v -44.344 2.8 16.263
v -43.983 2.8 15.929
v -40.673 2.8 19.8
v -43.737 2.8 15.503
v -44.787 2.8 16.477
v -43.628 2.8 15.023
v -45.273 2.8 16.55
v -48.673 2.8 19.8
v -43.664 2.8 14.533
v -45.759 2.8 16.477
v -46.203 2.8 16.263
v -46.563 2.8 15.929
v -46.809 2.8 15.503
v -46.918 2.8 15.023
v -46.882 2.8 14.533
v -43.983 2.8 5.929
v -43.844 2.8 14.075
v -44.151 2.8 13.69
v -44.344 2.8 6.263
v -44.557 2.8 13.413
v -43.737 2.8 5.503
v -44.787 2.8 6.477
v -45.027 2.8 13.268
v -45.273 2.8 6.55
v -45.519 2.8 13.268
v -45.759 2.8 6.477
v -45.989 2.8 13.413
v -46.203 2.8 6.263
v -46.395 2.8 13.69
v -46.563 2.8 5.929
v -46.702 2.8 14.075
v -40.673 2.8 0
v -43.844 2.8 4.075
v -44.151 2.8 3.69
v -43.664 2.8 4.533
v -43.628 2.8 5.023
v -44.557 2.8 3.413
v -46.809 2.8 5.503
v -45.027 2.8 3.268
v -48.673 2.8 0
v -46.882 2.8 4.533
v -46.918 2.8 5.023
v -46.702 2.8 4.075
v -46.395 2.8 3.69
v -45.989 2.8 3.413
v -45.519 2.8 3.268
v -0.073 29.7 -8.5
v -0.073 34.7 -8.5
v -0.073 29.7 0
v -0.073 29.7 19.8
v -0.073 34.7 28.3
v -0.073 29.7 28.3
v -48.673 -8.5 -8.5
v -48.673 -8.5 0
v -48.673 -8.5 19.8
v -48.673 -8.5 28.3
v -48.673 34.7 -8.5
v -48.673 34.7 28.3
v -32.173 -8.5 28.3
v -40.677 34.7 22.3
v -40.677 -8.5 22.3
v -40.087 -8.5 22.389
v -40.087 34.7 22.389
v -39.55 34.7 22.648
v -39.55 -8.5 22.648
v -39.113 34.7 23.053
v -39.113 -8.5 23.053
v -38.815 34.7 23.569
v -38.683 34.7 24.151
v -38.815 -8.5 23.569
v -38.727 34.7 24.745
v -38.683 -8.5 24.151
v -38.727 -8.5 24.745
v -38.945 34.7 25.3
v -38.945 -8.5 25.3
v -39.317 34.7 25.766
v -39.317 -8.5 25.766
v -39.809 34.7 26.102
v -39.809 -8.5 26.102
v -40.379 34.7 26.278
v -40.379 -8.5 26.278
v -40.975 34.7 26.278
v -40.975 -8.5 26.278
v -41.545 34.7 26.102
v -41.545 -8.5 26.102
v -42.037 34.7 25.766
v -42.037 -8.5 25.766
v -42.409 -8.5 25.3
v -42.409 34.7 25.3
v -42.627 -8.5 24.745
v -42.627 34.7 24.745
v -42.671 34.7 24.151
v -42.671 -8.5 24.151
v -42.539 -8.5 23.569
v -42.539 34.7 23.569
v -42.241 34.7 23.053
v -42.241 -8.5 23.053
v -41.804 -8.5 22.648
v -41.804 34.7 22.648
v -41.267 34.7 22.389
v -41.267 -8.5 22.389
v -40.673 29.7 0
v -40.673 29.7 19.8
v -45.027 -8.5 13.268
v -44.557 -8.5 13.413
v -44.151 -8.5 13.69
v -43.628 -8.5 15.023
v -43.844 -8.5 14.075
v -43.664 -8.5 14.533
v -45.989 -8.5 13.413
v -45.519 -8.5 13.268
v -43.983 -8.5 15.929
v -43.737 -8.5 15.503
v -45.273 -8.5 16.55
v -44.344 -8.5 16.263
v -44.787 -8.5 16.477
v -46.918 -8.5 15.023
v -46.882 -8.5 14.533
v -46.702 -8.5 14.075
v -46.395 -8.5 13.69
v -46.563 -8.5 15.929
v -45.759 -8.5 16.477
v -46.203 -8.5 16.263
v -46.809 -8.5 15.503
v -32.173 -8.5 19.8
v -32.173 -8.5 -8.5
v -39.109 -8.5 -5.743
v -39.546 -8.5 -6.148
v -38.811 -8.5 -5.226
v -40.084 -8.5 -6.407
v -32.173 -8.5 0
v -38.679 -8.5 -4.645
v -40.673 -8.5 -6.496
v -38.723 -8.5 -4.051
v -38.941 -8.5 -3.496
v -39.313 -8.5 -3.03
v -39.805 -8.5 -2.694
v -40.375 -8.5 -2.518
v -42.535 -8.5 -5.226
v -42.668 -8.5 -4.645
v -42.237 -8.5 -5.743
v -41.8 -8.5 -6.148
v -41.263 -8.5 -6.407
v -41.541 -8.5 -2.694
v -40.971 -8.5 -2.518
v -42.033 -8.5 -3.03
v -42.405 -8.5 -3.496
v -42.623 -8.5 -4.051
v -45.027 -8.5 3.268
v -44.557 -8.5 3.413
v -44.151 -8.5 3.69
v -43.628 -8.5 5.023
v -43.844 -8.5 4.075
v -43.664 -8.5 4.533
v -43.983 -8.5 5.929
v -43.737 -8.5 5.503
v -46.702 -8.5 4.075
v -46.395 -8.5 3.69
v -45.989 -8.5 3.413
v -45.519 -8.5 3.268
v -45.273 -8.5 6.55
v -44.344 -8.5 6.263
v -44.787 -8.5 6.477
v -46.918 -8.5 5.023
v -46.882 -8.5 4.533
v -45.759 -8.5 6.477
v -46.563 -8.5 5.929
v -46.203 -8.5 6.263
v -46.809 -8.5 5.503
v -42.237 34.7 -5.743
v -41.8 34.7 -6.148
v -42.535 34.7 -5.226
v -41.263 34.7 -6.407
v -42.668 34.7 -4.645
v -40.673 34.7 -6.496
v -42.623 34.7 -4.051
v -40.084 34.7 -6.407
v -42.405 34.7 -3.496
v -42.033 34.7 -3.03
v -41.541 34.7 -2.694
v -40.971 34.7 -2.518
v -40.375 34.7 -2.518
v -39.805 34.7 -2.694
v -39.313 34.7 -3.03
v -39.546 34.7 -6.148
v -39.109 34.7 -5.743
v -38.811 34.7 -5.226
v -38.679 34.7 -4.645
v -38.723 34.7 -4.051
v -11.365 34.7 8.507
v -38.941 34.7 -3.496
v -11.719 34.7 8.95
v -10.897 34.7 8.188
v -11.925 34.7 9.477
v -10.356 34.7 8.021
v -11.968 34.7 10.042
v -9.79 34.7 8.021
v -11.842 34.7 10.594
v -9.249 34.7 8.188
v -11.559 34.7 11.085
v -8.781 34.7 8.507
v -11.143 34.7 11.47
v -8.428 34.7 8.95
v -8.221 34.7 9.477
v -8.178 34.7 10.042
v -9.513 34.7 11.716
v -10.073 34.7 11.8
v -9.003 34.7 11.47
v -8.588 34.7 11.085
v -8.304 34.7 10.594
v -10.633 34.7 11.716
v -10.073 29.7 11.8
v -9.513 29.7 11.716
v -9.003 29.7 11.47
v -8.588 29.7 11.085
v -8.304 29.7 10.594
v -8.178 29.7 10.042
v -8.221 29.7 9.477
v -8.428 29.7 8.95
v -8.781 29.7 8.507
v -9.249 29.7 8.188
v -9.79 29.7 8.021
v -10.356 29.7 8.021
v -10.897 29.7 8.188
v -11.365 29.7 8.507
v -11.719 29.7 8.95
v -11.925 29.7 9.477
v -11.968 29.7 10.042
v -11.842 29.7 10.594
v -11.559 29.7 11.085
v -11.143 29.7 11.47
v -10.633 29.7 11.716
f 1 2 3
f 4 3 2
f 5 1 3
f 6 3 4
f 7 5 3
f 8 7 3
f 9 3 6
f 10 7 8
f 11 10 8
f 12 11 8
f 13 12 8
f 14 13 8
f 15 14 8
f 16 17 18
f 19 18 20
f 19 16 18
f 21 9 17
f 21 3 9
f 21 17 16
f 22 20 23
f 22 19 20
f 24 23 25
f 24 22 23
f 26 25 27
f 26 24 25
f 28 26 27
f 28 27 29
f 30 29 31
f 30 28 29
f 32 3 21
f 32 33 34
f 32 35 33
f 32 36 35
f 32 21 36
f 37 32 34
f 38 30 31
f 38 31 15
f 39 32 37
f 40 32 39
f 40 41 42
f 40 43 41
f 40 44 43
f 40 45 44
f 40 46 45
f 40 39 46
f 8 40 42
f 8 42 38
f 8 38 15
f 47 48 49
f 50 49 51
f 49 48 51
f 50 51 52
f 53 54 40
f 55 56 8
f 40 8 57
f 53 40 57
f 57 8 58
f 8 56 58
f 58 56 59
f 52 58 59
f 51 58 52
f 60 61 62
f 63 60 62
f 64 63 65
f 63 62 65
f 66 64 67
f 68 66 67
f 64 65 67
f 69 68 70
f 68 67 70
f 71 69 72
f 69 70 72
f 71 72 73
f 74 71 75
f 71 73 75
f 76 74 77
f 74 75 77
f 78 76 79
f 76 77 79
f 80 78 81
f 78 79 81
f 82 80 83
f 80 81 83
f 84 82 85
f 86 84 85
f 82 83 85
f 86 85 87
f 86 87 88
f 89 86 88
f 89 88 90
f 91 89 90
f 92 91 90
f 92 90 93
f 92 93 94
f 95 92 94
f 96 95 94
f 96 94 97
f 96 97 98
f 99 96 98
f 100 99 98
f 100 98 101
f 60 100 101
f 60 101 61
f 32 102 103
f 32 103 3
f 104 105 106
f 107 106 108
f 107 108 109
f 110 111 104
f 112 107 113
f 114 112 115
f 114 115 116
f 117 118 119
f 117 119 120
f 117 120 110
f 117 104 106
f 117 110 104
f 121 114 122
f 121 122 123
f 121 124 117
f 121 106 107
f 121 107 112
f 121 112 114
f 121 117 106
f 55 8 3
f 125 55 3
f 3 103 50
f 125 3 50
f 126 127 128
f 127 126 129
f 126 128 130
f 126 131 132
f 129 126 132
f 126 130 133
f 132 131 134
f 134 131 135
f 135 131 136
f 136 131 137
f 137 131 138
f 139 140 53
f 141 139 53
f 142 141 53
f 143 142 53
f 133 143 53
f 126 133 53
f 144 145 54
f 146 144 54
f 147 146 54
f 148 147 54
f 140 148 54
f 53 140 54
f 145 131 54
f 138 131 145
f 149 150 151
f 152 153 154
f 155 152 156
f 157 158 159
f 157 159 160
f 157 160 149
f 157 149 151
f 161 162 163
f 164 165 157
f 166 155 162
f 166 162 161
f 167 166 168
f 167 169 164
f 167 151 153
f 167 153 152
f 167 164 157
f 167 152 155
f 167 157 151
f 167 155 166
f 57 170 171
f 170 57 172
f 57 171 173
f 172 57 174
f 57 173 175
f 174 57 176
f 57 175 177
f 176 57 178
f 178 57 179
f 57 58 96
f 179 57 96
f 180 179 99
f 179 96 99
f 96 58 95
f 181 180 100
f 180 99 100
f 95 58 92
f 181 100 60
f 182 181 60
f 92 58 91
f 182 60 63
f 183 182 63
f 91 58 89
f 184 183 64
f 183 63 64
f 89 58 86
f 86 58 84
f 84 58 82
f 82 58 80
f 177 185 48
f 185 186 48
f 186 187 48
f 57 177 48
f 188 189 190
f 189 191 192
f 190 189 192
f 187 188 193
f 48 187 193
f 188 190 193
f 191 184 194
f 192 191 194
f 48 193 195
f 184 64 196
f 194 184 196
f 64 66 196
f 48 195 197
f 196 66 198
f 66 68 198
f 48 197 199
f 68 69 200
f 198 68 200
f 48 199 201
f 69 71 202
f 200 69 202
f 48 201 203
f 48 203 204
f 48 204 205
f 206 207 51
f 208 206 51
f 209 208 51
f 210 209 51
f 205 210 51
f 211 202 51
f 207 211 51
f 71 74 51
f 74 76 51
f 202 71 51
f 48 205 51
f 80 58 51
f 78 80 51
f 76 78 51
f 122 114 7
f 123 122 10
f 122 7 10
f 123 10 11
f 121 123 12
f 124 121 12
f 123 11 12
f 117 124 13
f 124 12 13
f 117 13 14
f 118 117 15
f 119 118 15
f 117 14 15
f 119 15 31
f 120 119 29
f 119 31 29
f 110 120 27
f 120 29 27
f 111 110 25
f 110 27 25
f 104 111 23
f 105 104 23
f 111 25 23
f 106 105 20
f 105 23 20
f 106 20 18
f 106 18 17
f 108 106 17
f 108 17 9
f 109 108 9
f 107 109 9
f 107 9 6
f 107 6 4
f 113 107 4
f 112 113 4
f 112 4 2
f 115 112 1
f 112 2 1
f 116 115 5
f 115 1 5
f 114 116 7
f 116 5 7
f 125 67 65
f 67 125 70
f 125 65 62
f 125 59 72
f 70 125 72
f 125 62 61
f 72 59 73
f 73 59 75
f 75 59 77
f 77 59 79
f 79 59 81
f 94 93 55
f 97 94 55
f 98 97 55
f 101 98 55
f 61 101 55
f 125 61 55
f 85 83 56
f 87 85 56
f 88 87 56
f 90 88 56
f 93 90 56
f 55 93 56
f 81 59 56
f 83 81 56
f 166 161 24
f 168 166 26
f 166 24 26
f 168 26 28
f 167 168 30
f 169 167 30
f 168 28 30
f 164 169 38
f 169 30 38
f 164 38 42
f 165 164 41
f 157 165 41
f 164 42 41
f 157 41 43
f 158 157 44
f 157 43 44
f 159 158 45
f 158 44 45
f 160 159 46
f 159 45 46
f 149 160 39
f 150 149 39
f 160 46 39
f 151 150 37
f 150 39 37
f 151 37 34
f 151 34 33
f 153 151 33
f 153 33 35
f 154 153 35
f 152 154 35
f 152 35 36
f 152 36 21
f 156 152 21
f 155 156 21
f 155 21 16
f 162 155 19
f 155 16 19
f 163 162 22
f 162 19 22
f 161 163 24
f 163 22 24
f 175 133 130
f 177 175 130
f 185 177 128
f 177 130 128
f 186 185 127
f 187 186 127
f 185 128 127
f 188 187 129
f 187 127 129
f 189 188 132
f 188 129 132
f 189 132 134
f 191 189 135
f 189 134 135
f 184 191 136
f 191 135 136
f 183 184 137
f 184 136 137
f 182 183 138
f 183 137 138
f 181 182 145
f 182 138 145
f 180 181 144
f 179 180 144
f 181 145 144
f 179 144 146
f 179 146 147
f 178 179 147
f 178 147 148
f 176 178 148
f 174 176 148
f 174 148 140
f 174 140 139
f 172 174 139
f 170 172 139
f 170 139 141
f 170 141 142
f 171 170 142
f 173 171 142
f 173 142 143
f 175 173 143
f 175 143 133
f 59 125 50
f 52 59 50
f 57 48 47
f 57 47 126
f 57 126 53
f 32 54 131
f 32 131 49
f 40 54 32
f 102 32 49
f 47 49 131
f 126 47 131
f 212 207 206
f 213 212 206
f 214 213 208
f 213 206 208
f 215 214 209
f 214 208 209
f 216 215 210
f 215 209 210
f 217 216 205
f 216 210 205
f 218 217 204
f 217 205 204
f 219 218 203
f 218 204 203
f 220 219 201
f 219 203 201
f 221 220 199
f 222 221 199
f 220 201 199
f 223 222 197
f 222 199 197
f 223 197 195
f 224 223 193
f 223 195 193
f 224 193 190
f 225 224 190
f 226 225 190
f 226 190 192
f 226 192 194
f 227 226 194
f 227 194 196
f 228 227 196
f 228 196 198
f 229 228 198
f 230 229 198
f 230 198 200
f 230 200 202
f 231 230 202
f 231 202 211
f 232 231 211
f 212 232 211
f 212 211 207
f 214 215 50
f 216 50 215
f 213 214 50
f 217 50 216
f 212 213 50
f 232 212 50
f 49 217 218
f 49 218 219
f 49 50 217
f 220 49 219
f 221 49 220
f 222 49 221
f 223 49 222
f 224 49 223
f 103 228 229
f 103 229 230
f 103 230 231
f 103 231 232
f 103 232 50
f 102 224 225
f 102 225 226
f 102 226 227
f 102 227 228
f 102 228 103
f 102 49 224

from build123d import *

# Parameters (mm, degrees)
EXTRUDE_1_DEPTH     = 19.8
EXTRUDE_1_2_DEPTH   = 19.8
SKETCH_2_W          = 1
SKETCH_2_H          = 0.8
CUT_EXTRUDE_1_DEPTH = 8
EXTRUDE_2_DEPTH     = 8.5
EXTRUDE_3_DEPTH     = 8.5
CUT_EXTRUDE_2_REACH = 72.966
SKETCH_5_R          = 1.9
CUT_EXTRUDE_5_REACH = 68.083
SKETCH_8_W          = 19.8
SKETCH_8_H          = 8.5
SKETCH_9_R          = 1.65
EXTRUDE_4_DEPTH     = 11.3
CUT_EXTRUDE_6_REACH = 72.966
SKETCH_10_R         = 2


with BuildPart() as part:
    # 草圖1 → 填料-伸長1 (new body)
    with BuildSketch(Plane.XY):
        Polygon((-40.673096552, 29.7), (-40.673096552, 2.8), (-48.673096552, 2.8), (-48.673096552, 34.7), (-41.673096552, 34.7), (-0.073096552, 34.7), (-0.073096552, 29.7), align=None)
    extrude(amount=EXTRUDE_1_DEPTH)



with BuildPart() as body_2:
    # 草圖1 → Extrude 1 2 (new body)
    with BuildSketch(Plane.XY):
        Polygon((-48.673096552, -8.5), (-40.673096552, -8.5), (-40.673096552, -3.2), (-40.673096552, 0), (-48.673096552, 0), align=None)
    extrude(amount=EXTRUDE_1_2_DEPTH)

    # 草圖2 → 除料-伸長1 (cut)
    with BuildSketch(Plane.ZY.offset(48.673096552)):
        with Locations((9.9, -0.4)):
            Rectangle(SKETCH_2_W, SKETCH_2_H)
    extrude(amount=-CUT_EXTRUDE_1_DEPTH, mode=Mode.SUBTRACT)


with BuildPart() as part_1:
    add(part.part)

    add(body_2.part)  # 填料-伸長2 merges body 2
    # 草圖3 → 填料-伸長2 (add)
    with BuildSketch(Plane.XY.offset(19.8)):
        Polygon((-48.673096552, -8.5), (-32.173096552, -8.5), (-0.073096552, 29.7), (-0.073096552, 34.7), (-48.673096552, 34.7), align=None)
    extrude(amount=EXTRUDE_2_DEPTH)

    # 草圖4 → 填料-伸長3 (add)
    with BuildSketch(Plane(origin=(0, 0, 0), x_dir=(-1, 0, 0), z_dir=(0, 0, -1))):
        Polygon((48.673096552, -8.5), (48.673096552, 34.7), (0.073096552, 34.7), (0.073096552, 29.7), (32.173096552, -8.5), align=None)
    extrude(amount=EXTRUDE_3_DEPTH)

    # 草圖5 → 除料-伸長2 (cut, up to next)
    with BuildSketch(Plane(origin=(0, 34.7, 0), x_dir=(1, 0, 0), z_dir=(0, 1, 0)), mode=Mode.PRIVATE) as cut_extrude_2_sk1:
        with Locations(Location((-10.073096552, -9.9, 0), (0, 0, 270))):
            Circle(SKETCH_5_R)
    cut_extrude_2_tool1 = extrude(cut_extrude_2_sk1.sketch, amount=-CUT_EXTRUDE_2_REACH, mode=Mode.PRIVATE) & part_1.part
    add(cut_extrude_2_tool1.solids().sort_by_distance((-10.073097, 34.7, 9.9))[0], mode=Mode.SUBTRACT)

    # 除料-伸長5: up to this plane
    cut_extrude_5_end = Plane(origin=(-0.073096552, 29.7, -8.5), z_dir=(-0.7655864074982082, 0.6433330806464003, 0))
    # 草圖8 → 除料-伸長5 (cut, up to the surface)
    with BuildSketch(Plane.ZY.offset(48.673096552), mode=Mode.PRIVATE) as cut_extrude_5_sk1:
        with Locations((9.9, -4.25)):
            Rectangle(SKETCH_8_W, SKETCH_8_H)
    cut_extrude_5_tool1 = split(extrude(cut_extrude_5_sk1.sketch, amount=-CUT_EXTRUDE_5_REACH, mode=Mode.PRIVATE), bisect_by=cut_extrude_5_end, keep=Keep.BOTH, mode=Mode.PRIVATE)
    add(cut_extrude_5_tool1.solids().sort_by_distance((-48.673097, -4.25, 9.9))[0], mode=Mode.SUBTRACT)

    # 草圖9 → 填料-伸長4 (add)
    with BuildSketch(Plane.XZ.offset(-2.8)):
        with Locations(Location((-45.273096552, 14.9, 0), (0, 0, 90))):
            Circle(SKETCH_9_R)
        with Locations(Location((-45.273096552, 4.9, 0), (0, 0, 90))):
            Circle(SKETCH_9_R)
    extrude(amount=EXTRUDE_4_DEPTH)

    # 草圖10 → 除料-伸長6 (cut, up to next)
    with BuildSketch(Plane(origin=(0, -8.5, 0), x_dir=(-1, 0, 0), z_dir=(0, -1, 0)), mode=Mode.PRIVATE) as cut_extrude_6_sk1:
        with Locations(Location((40.677003756, -24.3, 0), (0, 0, 90))):
            Circle(SKETCH_10_R)
    cut_extrude_6_tool1 = extrude(cut_extrude_6_sk1.sketch, amount=-CUT_EXTRUDE_6_REACH, mode=Mode.PRIVATE) & part_1.part
    # 草圖10 → 除料-伸長6 (cut, up to next)
    with BuildSketch(Plane(origin=(0, -8.5, 0), x_dir=(-1, 0, 0), z_dir=(0, -1, 0)), mode=Mode.PRIVATE) as cut_extrude_6_sk2:
        with Locations(Location((40.673096552, 4.495764624, 0), (0, 0, 90))):
            Circle(SKETCH_10_R)
    cut_extrude_6_tool2 = extrude(cut_extrude_6_sk2.sketch, amount=-CUT_EXTRUDE_6_REACH, mode=Mode.PRIVATE) & part_1.part
    add(cut_extrude_6_tool1.solids().sort_by_distance((-40.677004, -8.5, 24.3))[0], mode=Mode.SUBTRACT)
    add(cut_extrude_6_tool2.solids().sort_by_distance((-40.673097, -8.5, -4.495765))[0], mode=Mode.SUBTRACT)


solid = part_1.part
